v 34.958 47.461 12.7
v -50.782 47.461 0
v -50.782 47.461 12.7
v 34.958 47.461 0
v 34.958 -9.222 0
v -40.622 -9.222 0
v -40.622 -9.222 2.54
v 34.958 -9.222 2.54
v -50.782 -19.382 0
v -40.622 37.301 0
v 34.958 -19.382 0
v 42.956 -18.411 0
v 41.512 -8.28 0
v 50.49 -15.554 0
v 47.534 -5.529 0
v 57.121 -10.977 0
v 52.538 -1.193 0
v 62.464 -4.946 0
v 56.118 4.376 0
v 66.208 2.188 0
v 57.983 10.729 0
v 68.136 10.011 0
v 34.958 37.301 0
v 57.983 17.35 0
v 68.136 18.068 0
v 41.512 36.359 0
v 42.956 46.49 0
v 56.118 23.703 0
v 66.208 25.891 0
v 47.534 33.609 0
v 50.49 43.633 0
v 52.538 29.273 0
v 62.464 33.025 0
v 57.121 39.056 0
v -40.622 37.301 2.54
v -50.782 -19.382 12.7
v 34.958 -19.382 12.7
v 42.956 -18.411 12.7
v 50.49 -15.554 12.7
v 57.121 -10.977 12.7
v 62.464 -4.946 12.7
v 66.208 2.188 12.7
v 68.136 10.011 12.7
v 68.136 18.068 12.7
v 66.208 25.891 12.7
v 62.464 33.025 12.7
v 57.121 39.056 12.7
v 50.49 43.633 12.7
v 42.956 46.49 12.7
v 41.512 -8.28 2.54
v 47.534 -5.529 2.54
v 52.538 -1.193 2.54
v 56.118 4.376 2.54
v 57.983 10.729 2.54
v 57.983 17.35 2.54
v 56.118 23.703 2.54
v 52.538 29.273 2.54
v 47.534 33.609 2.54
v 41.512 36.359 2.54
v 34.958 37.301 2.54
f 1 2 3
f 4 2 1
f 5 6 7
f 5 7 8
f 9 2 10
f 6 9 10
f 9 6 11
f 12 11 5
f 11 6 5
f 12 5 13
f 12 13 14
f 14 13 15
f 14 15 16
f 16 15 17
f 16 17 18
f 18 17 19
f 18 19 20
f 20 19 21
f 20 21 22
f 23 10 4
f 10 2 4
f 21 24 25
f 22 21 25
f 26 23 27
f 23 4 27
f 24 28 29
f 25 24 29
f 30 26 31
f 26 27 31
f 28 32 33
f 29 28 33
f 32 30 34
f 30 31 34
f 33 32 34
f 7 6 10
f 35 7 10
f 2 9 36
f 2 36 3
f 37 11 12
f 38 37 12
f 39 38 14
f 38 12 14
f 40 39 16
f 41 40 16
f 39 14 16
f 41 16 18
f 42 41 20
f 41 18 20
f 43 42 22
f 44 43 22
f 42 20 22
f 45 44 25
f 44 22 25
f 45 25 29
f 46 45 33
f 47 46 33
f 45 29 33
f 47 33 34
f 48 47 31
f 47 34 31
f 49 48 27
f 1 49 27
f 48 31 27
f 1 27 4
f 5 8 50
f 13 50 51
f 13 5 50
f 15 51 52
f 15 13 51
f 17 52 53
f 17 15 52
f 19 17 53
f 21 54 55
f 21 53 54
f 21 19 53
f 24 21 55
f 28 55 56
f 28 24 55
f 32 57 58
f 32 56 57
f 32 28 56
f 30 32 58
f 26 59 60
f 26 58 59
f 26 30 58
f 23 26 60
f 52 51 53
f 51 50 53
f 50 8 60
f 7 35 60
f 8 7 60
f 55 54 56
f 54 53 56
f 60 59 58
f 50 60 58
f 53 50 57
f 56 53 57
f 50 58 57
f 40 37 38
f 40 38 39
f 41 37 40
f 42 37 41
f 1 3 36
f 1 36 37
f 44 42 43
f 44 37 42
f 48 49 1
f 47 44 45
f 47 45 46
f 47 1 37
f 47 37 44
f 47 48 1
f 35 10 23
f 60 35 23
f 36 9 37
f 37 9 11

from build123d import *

# Parameters (mm, degrees)
F0_W     = 85.7403278351
F0_H     = 66.843137145
F1_DEPTH = 12.7
F2_T     = -10.16


with BuildPart() as f1:
    # F0 (on Top) → F1 (new body)
    with BuildSketch(Plane.XY):
        with BuildLine():
            ThreePointArc((34.9580943584, -19.3818807602), (68.379662931, 14.0396878123), (34.9580943584, 47.4612563848))
            Line((34.9580943584, 47.4612563848), (34.9580943584, -19.3818807602))
        make_face()
        with Locations((-7.9120695591, 14.0396878123)):
            Rectangle(F0_W, F0_H)
    extrude(amount=F1_DEPTH)

    # F2
    f2_openings = [f1.faces().sort_by_distance(p)[0] for p in [
        (5.460988, 14.039688, 0),
    ]]
    offset(amount=F2_T, openings=f2_openings)


solid = f1.part
